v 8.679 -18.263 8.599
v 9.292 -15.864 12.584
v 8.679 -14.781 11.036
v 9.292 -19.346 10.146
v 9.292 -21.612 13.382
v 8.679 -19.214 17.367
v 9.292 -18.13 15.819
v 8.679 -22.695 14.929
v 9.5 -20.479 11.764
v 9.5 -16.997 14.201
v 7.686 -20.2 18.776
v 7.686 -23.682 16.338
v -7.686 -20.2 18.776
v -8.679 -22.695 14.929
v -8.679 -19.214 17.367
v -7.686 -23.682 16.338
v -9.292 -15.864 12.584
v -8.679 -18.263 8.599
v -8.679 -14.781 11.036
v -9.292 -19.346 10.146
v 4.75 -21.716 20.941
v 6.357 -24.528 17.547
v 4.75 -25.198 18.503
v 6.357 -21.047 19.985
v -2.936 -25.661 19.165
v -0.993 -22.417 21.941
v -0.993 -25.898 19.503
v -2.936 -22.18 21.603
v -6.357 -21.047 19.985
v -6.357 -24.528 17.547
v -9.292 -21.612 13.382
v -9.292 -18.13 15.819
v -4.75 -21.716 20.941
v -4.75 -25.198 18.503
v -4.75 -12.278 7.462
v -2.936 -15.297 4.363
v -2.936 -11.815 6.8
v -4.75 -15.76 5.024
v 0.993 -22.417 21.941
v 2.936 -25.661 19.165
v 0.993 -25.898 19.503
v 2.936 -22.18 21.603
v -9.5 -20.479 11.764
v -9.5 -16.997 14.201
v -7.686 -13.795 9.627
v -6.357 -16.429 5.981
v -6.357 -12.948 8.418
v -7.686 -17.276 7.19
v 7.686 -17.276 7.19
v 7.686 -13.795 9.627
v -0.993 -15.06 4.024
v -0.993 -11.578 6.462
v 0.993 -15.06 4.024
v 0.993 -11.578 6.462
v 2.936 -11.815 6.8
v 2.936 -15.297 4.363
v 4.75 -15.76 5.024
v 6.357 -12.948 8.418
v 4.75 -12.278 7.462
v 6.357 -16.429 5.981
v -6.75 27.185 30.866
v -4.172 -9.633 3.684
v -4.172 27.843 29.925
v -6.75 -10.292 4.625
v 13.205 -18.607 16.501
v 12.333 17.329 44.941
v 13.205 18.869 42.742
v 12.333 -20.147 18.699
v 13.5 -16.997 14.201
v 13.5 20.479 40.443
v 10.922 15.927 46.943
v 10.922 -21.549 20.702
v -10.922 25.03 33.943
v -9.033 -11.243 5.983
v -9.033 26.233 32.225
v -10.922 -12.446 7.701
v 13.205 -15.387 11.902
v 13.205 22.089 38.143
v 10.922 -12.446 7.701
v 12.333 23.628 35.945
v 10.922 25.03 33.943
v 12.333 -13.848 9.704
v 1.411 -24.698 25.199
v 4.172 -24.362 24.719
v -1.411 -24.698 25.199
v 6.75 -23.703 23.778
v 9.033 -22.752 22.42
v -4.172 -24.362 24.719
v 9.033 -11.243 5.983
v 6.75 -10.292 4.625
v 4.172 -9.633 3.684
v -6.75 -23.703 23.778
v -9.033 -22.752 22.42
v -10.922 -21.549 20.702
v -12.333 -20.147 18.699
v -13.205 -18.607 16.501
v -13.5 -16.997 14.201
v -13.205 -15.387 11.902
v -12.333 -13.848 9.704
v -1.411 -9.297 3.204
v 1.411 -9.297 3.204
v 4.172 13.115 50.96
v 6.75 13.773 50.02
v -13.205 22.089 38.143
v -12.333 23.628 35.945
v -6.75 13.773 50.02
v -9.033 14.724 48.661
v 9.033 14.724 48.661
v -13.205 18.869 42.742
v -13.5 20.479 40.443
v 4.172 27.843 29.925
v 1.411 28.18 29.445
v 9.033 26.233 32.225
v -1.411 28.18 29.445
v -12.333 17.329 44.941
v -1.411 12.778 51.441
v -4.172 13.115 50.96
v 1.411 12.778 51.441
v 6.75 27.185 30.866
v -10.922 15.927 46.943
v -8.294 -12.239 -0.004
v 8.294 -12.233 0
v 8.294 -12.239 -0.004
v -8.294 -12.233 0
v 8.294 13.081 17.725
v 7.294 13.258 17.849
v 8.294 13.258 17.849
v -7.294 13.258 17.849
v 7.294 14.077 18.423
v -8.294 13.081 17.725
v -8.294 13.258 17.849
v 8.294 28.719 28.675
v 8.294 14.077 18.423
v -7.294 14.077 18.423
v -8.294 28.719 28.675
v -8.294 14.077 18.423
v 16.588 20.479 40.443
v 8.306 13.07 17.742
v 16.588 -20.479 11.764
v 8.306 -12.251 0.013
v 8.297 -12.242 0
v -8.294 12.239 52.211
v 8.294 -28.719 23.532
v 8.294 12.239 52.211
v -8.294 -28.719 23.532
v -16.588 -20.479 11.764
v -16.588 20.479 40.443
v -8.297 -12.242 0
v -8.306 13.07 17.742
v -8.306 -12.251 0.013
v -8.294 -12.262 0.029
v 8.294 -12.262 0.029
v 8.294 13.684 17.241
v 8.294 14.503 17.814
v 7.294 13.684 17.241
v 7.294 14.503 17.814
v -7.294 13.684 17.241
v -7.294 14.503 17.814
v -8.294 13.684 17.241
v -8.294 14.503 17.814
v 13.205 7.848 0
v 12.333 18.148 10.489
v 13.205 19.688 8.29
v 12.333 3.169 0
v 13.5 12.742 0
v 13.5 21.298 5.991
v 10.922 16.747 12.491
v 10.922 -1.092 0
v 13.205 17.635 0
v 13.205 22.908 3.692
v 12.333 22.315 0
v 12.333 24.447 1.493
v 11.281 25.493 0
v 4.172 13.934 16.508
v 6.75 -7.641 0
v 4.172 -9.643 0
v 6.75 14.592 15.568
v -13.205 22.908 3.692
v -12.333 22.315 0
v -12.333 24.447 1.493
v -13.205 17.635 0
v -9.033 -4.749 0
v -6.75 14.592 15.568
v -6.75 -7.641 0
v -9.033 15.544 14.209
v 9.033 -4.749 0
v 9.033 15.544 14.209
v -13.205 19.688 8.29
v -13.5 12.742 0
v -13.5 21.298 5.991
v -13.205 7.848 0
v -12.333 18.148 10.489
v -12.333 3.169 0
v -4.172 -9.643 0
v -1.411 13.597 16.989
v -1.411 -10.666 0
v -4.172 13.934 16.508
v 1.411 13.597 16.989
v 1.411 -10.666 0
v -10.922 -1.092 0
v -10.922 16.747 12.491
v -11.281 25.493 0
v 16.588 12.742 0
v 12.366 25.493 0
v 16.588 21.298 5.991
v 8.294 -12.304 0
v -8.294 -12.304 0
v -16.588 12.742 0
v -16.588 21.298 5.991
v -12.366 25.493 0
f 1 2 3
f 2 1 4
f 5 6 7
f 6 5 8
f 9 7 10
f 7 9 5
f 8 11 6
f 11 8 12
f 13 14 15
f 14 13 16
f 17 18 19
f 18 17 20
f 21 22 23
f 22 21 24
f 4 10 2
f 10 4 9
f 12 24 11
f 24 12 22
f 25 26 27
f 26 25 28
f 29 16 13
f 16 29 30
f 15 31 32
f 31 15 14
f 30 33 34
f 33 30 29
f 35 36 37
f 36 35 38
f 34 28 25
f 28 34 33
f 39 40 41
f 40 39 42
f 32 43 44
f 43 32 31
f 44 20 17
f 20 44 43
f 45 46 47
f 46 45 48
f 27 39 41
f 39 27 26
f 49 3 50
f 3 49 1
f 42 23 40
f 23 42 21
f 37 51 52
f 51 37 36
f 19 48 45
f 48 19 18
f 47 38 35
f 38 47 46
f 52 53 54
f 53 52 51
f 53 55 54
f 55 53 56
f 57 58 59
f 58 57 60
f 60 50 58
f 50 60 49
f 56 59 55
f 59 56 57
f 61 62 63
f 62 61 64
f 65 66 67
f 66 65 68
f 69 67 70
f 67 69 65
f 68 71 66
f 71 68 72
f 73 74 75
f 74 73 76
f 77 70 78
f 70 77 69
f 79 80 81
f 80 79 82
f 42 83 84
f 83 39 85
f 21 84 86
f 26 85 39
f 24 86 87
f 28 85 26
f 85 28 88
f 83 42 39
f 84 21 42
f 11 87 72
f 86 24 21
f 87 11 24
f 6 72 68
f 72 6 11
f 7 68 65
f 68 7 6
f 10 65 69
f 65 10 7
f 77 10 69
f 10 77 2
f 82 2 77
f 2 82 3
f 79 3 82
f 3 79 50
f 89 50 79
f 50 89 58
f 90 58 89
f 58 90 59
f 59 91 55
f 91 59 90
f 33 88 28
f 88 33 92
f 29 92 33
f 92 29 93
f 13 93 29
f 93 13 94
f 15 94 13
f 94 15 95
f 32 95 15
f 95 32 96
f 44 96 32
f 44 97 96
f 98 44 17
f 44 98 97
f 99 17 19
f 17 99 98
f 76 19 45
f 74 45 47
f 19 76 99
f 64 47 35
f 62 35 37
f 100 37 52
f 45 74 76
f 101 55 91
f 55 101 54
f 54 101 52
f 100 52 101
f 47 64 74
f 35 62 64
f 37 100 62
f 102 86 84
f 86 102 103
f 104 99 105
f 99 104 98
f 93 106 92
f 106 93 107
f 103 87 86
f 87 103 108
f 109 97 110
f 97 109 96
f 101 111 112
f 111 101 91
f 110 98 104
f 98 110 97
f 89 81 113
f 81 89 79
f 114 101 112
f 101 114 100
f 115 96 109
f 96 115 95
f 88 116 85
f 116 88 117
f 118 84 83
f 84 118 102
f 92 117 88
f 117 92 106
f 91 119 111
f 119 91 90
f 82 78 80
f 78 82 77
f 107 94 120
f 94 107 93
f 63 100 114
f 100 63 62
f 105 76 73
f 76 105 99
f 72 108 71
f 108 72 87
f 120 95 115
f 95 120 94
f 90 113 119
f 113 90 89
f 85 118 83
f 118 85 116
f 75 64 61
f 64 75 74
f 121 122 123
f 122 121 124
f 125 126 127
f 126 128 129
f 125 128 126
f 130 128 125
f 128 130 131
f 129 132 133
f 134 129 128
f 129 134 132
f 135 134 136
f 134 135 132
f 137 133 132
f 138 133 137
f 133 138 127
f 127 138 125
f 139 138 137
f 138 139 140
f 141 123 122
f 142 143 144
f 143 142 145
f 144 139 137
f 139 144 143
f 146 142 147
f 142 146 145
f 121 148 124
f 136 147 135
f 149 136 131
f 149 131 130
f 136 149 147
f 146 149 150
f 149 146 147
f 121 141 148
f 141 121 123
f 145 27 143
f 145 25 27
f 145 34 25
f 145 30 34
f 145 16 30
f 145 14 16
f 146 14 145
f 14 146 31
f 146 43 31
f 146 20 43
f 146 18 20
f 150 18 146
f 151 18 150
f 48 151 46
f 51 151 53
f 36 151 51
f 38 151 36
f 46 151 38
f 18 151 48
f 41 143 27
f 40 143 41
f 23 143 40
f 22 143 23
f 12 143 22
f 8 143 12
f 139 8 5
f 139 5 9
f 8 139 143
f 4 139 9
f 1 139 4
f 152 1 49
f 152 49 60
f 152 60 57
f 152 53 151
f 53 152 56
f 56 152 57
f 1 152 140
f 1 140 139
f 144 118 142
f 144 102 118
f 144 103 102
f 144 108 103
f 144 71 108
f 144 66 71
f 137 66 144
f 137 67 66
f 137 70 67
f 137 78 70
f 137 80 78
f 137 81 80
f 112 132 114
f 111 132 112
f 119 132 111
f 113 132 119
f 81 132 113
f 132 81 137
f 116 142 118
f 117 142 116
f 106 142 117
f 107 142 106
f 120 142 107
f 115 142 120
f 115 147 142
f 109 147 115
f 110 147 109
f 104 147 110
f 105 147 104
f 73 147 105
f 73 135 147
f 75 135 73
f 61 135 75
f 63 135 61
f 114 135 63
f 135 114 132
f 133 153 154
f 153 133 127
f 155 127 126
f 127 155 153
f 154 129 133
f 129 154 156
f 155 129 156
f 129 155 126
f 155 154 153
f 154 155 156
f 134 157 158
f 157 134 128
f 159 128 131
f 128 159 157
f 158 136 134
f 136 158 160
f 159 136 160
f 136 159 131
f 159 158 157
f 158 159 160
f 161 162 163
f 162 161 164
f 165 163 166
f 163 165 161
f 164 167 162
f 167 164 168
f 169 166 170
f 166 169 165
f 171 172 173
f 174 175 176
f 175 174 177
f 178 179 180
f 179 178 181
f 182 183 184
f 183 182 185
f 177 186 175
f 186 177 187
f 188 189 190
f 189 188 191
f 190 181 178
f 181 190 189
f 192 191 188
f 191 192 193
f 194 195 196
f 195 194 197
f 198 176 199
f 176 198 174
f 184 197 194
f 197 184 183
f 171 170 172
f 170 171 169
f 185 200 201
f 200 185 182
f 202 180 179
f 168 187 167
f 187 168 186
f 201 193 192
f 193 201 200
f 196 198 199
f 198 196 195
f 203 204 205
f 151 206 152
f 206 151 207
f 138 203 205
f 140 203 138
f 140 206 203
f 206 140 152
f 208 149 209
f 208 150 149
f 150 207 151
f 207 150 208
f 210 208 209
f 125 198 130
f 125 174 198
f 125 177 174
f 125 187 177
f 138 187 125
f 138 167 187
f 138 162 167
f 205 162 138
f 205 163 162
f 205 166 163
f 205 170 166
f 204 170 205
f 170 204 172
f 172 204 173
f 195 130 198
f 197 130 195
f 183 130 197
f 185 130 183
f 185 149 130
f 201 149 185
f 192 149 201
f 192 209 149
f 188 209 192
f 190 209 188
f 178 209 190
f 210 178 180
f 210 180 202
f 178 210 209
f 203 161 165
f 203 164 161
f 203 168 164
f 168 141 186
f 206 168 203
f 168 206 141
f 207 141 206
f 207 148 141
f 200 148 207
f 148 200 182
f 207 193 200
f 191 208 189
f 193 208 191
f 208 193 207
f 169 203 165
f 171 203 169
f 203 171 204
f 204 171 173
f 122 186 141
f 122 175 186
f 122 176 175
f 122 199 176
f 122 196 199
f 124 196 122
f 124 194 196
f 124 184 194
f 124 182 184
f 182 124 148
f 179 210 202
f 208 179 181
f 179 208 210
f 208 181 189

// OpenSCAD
// file: bottle.scad
// I couldn't find anyone who has taken measurements of the various bottle
// dimensions and made them available. Some measurements are taken but they are
// always incomplete. These measurements are taken with my own calipers.


// I measured 26mm diameter, but add a little more.
bottleBodyDiameterVallejo=27.0;
bottleCapHeight=28;
bottleCapWideDiameter=19;
// Vallejo, Army Painter, and Reaper all use the same cap sizes.
module bottleCap() {
  neckNarrowDiameter=8.5;
  neckNarrowHeight=12;
  neckWideHeight=17;
  translate([0, 0, neckWideHeight / 2]) {
    translate([
      0, 0, neckNarrowHeight,
    ])
      cylinder(d=neckNarrowDiameter, h=neckNarrowHeight, center = true);
    cylinder(d=bottleCapWideDiameter, h=neckWideHeight, center = true);
  }
}

// The real bottle cap and body are conical and rounded (respectively). These
// should serve as decent approximations though. Wouldn't it be swell to get
// this information from the source?!
module bottleVallejo() {
  height=77.5;
  let (
    bodyHeight = height - bottleCapHeight
  ) {
    // Center the entire model by accounting for the cap height.
    translate([0,0, -bottleCapHeight / 2]) {
      translate([
        0, 0, bodyHeight / 2 - 0.1,
      ]) {
        bottleCap();
      }
      cylinder(d=bottleBodyDiameterVallejo, h=bodyHeight, center = true);
    }
  }
}
// main file
/*******************************************************************************
 * This is a vertical paint stand which can be stacked.
 *
 * Stacking allows us to print on smaller beds and reduces damage in the event
 * of a print failure.
 *
 * Currently it holds paint bottles from Reaper and Vallejo. The design will
 * hopefully make adding support for other paint bottles a relatively easy task.
 *
 * The design uses a stackable structure. The structure can be stacked both
 * vertically and horizontally, to allow widths and heights that smaller print
 * beds may not be able to accommodate. Any joined parts can be removed via a
 * release. The structure is held by flexible clips.
 ******************************************************************************/

module flexClip() {
  /* cube([10, 5, 3], center = true); */
  /* rotate(a=45, v=[0, 1, 0]) */
  /*   translate([10, 0, 3]) */
  /*   cube([10, 5, 3], center = true); */
  polygon(
    points=[
      [0,0],
      [8,0],
      [8,1],
      [7,2],
      [6,2],
      [6,3],
      [8,3],
      [10,0],
      [10,-1],
      [0,-1],
    ]
  );
}

include <bottle.scad>

frameHorizontalGap=17.5;
cradleThickness=1;
// Unusual vocabulary: The apothem is the radius of a regular polygon from the
// center to the middle of the flat edge, and the nearest point from center.
// This comes up quite a bit when dealing with a hexagonal cradle.
apothemFactor=pow(3, 1/2) / 2;
// This gives us a very direct relationship with the cradleThickness, so we can
// be sure the thinnest point is described by the thickness. A thickness of 0
// would mean that the midpoint of each side would have a thickness of 0 (which
// would not be printable).
cradleRadius=cradleThickness + (bottleBodyDiameterVallejo / 2) / apothemFactor;
cradleApothem=cradleRadius * apothemFactor;
cradleLength=50;
cradleAngle=35;
cradleHandOffset=cos(90 + cradleAngle) * cradleApothem * 2;
cradleFloorOffset=
  -cos(90 + cradleAngle) * cradleRadius + cradleRadius
  // Keep the corners of the arms from dipping below the positive Z axis.
  /* + cos(cradleAngle) * cradleThickness */
  /* - cos(90 + cradleAngle) * cradleLength */
  ;
frameWidth=10;
frameDepth=10;
jointHeight=10;
strutHeight=50;
module strut() {
  translate([0, 0, jointHeight / 2])
    cube([frameWidth, frameDepth, strutHeight - jointHeight], center = true);
}

module fourLegsFrame() {
  let(jointSize = [frameWidth, frameDepth, jointHeight]) {
    translate([frameHorizontalGap, -frameHorizontalGap, 0])
      strutStarboardWithAnnular(jointSize, 10);
    translate([-frameHorizontalGap, -frameHorizontalGap, 0])
      strutPortWithAnnular(jointSize, 10);
    translate([frameHorizontalGap, frameHorizontalGap, 0])
      strutStarboardWithAnnular(jointSize, 0);
    translate([-frameHorizontalGap, frameHorizontalGap, 0])
      strutPortWithAnnular(jointSize, 0);
  }
}

module hexCradle(reducedMaterial) {
  difference() {
    let($fn=6) {
      color("red")
        cylinder(r=cradleRadius, h=cradleLength, center=true);
    }
    translate([0, 0, 10])
      bottleVallejo();
    // THis still needs some work. I'd like it to play nice with the hands and
    // also work two dimensionally across the surface. I do need to verify
    // whether or not this requires additional supports, which might make this
    // counterproductive.
    if(reducedMaterial) {
      let(optimizationSize=5) {
        for(x=[0:optimizationSize * pow(2, 1/2) + cradleThickness:cradleLength]) {
          for(a=[0:60:360-60]) {
            translate([0, 0, x - cradleLength / 2]) {
              rotate(a=a, v=[0, 0, a])
                rotate(a=45, v=[0, 1, 0])
                cube(
                  [optimizationSize, cradleRadius * 2 + zPeace, optimizationSize],
                  center = true
                );
            }
          }
        }
      }
    }
  }
}


module hexTiltedCradle(reducedMaterial) {
  difference() {
    rotate(a=90 + cradleAngle, v=[1,0,0]) {
      hexCradle(reducedMaterial);
    }
  }
}

module hexHands(thickness) {
  // We want to know the point at which two stacked cradles will line up,
  // assuming the staccking involves no movement along the y axis. From here, we
  // can make small hands with which to grasp the lower cradle. This should line
  // up perfectly with the top of the bottom cradle.
  let (
    // In a perfect hexagon, the side length and the radius are the same. The
    // radius is also the height, which we use as a z offset here. I don't quite
    // understand why it needs to be divided by two.
    zOffset = -cradleApothem / 2,
    yOffset = -cos(90 + cradleAngle) * cradleLength / 2
  ) {
    // This translation places us along the edge of the cradle.
    translate([0, yOffset, zOffset]) {
      // A handy marker for debugging. Keep around.
      /* sphere(3); */
      // We have virtually no depth and cut off the hexagonal shape halfway
      // through its edge.
      rotate(a=90 + cradleAngle, v=[1,0,0]) {
        translate([0, 0, cradleLength / 2 + cradleThickness / 2]) {
          let(xOffset = cos(30) * cradleApothem * 2) {
            /* translate([xOffset, 0, 0]) */
            /*   rotate(a=60, v=[0, 0, 1]) */
            /*   halfHexHand(1); */
            translate([
              0,
              -thickness / 2,
              cradleLength / -2 + cradleThickness / 2,
            ]) {
              let(x = cradleRadius / 2 - thickness / 2) {
                translate([x, 0, 0])
                  hexFinger(thickness);
                translate([-x, 0, 0])
                  hexFinger(thickness);
              }
            }
            /* translate([-xOffset, 0, 0]) */
            /*   rotate(a=-60, v=[0, 0, 1]) */
            /*   halfHexHand(-1); */
          }
        }
        /* translate([0, 0, cradleThickness / 2]) { */
        /*   hexHandButtress(1); */
        /*   hexHandButtress(-1); */
        /* } */
      }
    }
  }
}

// We don't want a whole hand on the sides or they will overlap with
// horizontally adjacent cradles.
module halfHexHand(side) {
  difference() {
    hexCradle(false);
    translate([0, 0, cradleThickness])
      cube(
        [cradleRadius * 2, cradleRadius * 2, cradleLength],
        center=true
      );
    translate([
      0,
      -cradleApothem / 2,
      cradleLength / -2
    ]) {
      translate([0,0, cradleThickness / 2])
      cube(
        [
          cradleRadius * 2,
          zPeace + cradleApothem,
          cradleThickness + zPeace * 2
        ],
        center = true
      );
      translate([side * cradleRadius / 2, cradleApothem, cradleThickness / 2])
        cube(
          [
            cradleRadius,
            zPeace + cradleApothem,
            cradleThickness + zPeace * 2
          ],
          center = true
        );
    }
  }
}

module hexFinger(thickness) {
  cube([thickness, thickness, thickness], center=true);
}

module hexHand() {
  difference() {
    hexCradle(false);
    translate([0, 0, cradleThickness])
      cube(
        [cradleRadius * 2, cradleRadius * 2, cradleLength],
        center=true
      );
    translate([
      0,
      -cradleApothem / 2,
      cradleLength / -2 + cradleThickness / 2
    ])
      cube(
        [
          cradleRadius * 2,
          zPeace + cradleApothem,
          cradleThickness + zPeace * 2
        ],
        center = true
      );
  }
}

// Create a support to help hold the hands together.
module hexHandButtress(side) {
  translate([cradleRadius / 2 * side, 0, 0])
    rotate(a=side == 1 ? -60 : 240, v=[0, 0, 1])
  rotate(a=90, v=[1, 0, 0])
    // TODO: Extrude this by cradleThickness so we can avoid warnings. I think
    // right now it assumes 1.
    linear_extrude(height=cradleThickness, center = true)
    polygon([
      [0,0],
      [0, -cradleRadius],
      [cradleRadius - cradleThickness, 0],
    ]);
}

// This increases surface area on the bottom, which should make for a more
// reliable print. I have noticed that it can easily come off while printing
// when only a single line is connecting with the ground.
module hexTiltedCradleSupport() {
  let(
    supportHeight = -cos( cradleAngle) * (bottleCapWideDiameter / 2 - cradleApothem),
    supportLength = -sin(cradleAngle) * (bottleCapWideDiameter / 2 - cradleApothem)
  ) {
    translate([
      0,
      -cos(90 - cradleAngle) * cradleFloorOffset + supportLength + zPeace,
      0,
    ])
      rotate(a=90, v=[1, 0, 0])
      rotate(a=90, v=[0, 1, 0])
      linear_extrude(center=true, height=cradleRadius)
      // Ugh, this is a mess. Clean it up someday.
      polygon([
        [-(supportLength + zPeace), (supportHeight + zPeace)],
        [-(supportLength + zPeace) * 2, 0],
        [0, 0],
      ]);
  }
}

module hexCradleFull() {
  // Disabled for now. See implementation in hexCradle for details.
  hexTiltedCradle(false);
  hexHands(1);
  /* translate([0, 0, -cradleFloorOffset]) */
  /*   hexTiltedCradleSupport(); */
}

module hexCradleFoot() {
  difference() {
    translate([
      0,
      // Whoa. Tune carefully here. The foot is rises to mate perfectly with a
      // cradle whose back end rests at z=0. The hands also mate against the
      // face of the foot.
      +cos(cradleAngle) * cradleThickness,
      -cos(90 + cradleAngle) * cradleApothem - cradleRadius,
    ])
      // There may be merit in optimizing this geometry as well, but for now
      // leave it disabled - it doesn't work yet in the case of the normal
      // cradle.
      hexTiltedCradle(false);
    translate([0, 0, -cradleLength])
      cube([cradleLength * 2, cradleLength * 2, cradleLength * 2], center = true);
  }
}

// Override these as needed, especially from the command line to generate
// separate models.
showFoot=true;
showCradle=true;
layFlat=false;
if(showCradle) {
  if(layFlat) {
    rotate(a=90 - cradleAngle, v=[1, 0, 0])
      hexCradleFull();
  }
  else {
    translate([0, 0, cradleFloorOffset])
      hexCradleFull();
  }
}
if(showFoot) {
  color("yellow")
    hexCradleFoot();
}


preview = false;
// End z-fighting by nudging an object over with this value.
zPeace = 0.01;

/* include <diagonal-frame-joint.scad> */
/* include <peg-press-fit-joint.scad> */
/* include <fastener-joint.scad> */
/* include <annular-joint.scad> */
